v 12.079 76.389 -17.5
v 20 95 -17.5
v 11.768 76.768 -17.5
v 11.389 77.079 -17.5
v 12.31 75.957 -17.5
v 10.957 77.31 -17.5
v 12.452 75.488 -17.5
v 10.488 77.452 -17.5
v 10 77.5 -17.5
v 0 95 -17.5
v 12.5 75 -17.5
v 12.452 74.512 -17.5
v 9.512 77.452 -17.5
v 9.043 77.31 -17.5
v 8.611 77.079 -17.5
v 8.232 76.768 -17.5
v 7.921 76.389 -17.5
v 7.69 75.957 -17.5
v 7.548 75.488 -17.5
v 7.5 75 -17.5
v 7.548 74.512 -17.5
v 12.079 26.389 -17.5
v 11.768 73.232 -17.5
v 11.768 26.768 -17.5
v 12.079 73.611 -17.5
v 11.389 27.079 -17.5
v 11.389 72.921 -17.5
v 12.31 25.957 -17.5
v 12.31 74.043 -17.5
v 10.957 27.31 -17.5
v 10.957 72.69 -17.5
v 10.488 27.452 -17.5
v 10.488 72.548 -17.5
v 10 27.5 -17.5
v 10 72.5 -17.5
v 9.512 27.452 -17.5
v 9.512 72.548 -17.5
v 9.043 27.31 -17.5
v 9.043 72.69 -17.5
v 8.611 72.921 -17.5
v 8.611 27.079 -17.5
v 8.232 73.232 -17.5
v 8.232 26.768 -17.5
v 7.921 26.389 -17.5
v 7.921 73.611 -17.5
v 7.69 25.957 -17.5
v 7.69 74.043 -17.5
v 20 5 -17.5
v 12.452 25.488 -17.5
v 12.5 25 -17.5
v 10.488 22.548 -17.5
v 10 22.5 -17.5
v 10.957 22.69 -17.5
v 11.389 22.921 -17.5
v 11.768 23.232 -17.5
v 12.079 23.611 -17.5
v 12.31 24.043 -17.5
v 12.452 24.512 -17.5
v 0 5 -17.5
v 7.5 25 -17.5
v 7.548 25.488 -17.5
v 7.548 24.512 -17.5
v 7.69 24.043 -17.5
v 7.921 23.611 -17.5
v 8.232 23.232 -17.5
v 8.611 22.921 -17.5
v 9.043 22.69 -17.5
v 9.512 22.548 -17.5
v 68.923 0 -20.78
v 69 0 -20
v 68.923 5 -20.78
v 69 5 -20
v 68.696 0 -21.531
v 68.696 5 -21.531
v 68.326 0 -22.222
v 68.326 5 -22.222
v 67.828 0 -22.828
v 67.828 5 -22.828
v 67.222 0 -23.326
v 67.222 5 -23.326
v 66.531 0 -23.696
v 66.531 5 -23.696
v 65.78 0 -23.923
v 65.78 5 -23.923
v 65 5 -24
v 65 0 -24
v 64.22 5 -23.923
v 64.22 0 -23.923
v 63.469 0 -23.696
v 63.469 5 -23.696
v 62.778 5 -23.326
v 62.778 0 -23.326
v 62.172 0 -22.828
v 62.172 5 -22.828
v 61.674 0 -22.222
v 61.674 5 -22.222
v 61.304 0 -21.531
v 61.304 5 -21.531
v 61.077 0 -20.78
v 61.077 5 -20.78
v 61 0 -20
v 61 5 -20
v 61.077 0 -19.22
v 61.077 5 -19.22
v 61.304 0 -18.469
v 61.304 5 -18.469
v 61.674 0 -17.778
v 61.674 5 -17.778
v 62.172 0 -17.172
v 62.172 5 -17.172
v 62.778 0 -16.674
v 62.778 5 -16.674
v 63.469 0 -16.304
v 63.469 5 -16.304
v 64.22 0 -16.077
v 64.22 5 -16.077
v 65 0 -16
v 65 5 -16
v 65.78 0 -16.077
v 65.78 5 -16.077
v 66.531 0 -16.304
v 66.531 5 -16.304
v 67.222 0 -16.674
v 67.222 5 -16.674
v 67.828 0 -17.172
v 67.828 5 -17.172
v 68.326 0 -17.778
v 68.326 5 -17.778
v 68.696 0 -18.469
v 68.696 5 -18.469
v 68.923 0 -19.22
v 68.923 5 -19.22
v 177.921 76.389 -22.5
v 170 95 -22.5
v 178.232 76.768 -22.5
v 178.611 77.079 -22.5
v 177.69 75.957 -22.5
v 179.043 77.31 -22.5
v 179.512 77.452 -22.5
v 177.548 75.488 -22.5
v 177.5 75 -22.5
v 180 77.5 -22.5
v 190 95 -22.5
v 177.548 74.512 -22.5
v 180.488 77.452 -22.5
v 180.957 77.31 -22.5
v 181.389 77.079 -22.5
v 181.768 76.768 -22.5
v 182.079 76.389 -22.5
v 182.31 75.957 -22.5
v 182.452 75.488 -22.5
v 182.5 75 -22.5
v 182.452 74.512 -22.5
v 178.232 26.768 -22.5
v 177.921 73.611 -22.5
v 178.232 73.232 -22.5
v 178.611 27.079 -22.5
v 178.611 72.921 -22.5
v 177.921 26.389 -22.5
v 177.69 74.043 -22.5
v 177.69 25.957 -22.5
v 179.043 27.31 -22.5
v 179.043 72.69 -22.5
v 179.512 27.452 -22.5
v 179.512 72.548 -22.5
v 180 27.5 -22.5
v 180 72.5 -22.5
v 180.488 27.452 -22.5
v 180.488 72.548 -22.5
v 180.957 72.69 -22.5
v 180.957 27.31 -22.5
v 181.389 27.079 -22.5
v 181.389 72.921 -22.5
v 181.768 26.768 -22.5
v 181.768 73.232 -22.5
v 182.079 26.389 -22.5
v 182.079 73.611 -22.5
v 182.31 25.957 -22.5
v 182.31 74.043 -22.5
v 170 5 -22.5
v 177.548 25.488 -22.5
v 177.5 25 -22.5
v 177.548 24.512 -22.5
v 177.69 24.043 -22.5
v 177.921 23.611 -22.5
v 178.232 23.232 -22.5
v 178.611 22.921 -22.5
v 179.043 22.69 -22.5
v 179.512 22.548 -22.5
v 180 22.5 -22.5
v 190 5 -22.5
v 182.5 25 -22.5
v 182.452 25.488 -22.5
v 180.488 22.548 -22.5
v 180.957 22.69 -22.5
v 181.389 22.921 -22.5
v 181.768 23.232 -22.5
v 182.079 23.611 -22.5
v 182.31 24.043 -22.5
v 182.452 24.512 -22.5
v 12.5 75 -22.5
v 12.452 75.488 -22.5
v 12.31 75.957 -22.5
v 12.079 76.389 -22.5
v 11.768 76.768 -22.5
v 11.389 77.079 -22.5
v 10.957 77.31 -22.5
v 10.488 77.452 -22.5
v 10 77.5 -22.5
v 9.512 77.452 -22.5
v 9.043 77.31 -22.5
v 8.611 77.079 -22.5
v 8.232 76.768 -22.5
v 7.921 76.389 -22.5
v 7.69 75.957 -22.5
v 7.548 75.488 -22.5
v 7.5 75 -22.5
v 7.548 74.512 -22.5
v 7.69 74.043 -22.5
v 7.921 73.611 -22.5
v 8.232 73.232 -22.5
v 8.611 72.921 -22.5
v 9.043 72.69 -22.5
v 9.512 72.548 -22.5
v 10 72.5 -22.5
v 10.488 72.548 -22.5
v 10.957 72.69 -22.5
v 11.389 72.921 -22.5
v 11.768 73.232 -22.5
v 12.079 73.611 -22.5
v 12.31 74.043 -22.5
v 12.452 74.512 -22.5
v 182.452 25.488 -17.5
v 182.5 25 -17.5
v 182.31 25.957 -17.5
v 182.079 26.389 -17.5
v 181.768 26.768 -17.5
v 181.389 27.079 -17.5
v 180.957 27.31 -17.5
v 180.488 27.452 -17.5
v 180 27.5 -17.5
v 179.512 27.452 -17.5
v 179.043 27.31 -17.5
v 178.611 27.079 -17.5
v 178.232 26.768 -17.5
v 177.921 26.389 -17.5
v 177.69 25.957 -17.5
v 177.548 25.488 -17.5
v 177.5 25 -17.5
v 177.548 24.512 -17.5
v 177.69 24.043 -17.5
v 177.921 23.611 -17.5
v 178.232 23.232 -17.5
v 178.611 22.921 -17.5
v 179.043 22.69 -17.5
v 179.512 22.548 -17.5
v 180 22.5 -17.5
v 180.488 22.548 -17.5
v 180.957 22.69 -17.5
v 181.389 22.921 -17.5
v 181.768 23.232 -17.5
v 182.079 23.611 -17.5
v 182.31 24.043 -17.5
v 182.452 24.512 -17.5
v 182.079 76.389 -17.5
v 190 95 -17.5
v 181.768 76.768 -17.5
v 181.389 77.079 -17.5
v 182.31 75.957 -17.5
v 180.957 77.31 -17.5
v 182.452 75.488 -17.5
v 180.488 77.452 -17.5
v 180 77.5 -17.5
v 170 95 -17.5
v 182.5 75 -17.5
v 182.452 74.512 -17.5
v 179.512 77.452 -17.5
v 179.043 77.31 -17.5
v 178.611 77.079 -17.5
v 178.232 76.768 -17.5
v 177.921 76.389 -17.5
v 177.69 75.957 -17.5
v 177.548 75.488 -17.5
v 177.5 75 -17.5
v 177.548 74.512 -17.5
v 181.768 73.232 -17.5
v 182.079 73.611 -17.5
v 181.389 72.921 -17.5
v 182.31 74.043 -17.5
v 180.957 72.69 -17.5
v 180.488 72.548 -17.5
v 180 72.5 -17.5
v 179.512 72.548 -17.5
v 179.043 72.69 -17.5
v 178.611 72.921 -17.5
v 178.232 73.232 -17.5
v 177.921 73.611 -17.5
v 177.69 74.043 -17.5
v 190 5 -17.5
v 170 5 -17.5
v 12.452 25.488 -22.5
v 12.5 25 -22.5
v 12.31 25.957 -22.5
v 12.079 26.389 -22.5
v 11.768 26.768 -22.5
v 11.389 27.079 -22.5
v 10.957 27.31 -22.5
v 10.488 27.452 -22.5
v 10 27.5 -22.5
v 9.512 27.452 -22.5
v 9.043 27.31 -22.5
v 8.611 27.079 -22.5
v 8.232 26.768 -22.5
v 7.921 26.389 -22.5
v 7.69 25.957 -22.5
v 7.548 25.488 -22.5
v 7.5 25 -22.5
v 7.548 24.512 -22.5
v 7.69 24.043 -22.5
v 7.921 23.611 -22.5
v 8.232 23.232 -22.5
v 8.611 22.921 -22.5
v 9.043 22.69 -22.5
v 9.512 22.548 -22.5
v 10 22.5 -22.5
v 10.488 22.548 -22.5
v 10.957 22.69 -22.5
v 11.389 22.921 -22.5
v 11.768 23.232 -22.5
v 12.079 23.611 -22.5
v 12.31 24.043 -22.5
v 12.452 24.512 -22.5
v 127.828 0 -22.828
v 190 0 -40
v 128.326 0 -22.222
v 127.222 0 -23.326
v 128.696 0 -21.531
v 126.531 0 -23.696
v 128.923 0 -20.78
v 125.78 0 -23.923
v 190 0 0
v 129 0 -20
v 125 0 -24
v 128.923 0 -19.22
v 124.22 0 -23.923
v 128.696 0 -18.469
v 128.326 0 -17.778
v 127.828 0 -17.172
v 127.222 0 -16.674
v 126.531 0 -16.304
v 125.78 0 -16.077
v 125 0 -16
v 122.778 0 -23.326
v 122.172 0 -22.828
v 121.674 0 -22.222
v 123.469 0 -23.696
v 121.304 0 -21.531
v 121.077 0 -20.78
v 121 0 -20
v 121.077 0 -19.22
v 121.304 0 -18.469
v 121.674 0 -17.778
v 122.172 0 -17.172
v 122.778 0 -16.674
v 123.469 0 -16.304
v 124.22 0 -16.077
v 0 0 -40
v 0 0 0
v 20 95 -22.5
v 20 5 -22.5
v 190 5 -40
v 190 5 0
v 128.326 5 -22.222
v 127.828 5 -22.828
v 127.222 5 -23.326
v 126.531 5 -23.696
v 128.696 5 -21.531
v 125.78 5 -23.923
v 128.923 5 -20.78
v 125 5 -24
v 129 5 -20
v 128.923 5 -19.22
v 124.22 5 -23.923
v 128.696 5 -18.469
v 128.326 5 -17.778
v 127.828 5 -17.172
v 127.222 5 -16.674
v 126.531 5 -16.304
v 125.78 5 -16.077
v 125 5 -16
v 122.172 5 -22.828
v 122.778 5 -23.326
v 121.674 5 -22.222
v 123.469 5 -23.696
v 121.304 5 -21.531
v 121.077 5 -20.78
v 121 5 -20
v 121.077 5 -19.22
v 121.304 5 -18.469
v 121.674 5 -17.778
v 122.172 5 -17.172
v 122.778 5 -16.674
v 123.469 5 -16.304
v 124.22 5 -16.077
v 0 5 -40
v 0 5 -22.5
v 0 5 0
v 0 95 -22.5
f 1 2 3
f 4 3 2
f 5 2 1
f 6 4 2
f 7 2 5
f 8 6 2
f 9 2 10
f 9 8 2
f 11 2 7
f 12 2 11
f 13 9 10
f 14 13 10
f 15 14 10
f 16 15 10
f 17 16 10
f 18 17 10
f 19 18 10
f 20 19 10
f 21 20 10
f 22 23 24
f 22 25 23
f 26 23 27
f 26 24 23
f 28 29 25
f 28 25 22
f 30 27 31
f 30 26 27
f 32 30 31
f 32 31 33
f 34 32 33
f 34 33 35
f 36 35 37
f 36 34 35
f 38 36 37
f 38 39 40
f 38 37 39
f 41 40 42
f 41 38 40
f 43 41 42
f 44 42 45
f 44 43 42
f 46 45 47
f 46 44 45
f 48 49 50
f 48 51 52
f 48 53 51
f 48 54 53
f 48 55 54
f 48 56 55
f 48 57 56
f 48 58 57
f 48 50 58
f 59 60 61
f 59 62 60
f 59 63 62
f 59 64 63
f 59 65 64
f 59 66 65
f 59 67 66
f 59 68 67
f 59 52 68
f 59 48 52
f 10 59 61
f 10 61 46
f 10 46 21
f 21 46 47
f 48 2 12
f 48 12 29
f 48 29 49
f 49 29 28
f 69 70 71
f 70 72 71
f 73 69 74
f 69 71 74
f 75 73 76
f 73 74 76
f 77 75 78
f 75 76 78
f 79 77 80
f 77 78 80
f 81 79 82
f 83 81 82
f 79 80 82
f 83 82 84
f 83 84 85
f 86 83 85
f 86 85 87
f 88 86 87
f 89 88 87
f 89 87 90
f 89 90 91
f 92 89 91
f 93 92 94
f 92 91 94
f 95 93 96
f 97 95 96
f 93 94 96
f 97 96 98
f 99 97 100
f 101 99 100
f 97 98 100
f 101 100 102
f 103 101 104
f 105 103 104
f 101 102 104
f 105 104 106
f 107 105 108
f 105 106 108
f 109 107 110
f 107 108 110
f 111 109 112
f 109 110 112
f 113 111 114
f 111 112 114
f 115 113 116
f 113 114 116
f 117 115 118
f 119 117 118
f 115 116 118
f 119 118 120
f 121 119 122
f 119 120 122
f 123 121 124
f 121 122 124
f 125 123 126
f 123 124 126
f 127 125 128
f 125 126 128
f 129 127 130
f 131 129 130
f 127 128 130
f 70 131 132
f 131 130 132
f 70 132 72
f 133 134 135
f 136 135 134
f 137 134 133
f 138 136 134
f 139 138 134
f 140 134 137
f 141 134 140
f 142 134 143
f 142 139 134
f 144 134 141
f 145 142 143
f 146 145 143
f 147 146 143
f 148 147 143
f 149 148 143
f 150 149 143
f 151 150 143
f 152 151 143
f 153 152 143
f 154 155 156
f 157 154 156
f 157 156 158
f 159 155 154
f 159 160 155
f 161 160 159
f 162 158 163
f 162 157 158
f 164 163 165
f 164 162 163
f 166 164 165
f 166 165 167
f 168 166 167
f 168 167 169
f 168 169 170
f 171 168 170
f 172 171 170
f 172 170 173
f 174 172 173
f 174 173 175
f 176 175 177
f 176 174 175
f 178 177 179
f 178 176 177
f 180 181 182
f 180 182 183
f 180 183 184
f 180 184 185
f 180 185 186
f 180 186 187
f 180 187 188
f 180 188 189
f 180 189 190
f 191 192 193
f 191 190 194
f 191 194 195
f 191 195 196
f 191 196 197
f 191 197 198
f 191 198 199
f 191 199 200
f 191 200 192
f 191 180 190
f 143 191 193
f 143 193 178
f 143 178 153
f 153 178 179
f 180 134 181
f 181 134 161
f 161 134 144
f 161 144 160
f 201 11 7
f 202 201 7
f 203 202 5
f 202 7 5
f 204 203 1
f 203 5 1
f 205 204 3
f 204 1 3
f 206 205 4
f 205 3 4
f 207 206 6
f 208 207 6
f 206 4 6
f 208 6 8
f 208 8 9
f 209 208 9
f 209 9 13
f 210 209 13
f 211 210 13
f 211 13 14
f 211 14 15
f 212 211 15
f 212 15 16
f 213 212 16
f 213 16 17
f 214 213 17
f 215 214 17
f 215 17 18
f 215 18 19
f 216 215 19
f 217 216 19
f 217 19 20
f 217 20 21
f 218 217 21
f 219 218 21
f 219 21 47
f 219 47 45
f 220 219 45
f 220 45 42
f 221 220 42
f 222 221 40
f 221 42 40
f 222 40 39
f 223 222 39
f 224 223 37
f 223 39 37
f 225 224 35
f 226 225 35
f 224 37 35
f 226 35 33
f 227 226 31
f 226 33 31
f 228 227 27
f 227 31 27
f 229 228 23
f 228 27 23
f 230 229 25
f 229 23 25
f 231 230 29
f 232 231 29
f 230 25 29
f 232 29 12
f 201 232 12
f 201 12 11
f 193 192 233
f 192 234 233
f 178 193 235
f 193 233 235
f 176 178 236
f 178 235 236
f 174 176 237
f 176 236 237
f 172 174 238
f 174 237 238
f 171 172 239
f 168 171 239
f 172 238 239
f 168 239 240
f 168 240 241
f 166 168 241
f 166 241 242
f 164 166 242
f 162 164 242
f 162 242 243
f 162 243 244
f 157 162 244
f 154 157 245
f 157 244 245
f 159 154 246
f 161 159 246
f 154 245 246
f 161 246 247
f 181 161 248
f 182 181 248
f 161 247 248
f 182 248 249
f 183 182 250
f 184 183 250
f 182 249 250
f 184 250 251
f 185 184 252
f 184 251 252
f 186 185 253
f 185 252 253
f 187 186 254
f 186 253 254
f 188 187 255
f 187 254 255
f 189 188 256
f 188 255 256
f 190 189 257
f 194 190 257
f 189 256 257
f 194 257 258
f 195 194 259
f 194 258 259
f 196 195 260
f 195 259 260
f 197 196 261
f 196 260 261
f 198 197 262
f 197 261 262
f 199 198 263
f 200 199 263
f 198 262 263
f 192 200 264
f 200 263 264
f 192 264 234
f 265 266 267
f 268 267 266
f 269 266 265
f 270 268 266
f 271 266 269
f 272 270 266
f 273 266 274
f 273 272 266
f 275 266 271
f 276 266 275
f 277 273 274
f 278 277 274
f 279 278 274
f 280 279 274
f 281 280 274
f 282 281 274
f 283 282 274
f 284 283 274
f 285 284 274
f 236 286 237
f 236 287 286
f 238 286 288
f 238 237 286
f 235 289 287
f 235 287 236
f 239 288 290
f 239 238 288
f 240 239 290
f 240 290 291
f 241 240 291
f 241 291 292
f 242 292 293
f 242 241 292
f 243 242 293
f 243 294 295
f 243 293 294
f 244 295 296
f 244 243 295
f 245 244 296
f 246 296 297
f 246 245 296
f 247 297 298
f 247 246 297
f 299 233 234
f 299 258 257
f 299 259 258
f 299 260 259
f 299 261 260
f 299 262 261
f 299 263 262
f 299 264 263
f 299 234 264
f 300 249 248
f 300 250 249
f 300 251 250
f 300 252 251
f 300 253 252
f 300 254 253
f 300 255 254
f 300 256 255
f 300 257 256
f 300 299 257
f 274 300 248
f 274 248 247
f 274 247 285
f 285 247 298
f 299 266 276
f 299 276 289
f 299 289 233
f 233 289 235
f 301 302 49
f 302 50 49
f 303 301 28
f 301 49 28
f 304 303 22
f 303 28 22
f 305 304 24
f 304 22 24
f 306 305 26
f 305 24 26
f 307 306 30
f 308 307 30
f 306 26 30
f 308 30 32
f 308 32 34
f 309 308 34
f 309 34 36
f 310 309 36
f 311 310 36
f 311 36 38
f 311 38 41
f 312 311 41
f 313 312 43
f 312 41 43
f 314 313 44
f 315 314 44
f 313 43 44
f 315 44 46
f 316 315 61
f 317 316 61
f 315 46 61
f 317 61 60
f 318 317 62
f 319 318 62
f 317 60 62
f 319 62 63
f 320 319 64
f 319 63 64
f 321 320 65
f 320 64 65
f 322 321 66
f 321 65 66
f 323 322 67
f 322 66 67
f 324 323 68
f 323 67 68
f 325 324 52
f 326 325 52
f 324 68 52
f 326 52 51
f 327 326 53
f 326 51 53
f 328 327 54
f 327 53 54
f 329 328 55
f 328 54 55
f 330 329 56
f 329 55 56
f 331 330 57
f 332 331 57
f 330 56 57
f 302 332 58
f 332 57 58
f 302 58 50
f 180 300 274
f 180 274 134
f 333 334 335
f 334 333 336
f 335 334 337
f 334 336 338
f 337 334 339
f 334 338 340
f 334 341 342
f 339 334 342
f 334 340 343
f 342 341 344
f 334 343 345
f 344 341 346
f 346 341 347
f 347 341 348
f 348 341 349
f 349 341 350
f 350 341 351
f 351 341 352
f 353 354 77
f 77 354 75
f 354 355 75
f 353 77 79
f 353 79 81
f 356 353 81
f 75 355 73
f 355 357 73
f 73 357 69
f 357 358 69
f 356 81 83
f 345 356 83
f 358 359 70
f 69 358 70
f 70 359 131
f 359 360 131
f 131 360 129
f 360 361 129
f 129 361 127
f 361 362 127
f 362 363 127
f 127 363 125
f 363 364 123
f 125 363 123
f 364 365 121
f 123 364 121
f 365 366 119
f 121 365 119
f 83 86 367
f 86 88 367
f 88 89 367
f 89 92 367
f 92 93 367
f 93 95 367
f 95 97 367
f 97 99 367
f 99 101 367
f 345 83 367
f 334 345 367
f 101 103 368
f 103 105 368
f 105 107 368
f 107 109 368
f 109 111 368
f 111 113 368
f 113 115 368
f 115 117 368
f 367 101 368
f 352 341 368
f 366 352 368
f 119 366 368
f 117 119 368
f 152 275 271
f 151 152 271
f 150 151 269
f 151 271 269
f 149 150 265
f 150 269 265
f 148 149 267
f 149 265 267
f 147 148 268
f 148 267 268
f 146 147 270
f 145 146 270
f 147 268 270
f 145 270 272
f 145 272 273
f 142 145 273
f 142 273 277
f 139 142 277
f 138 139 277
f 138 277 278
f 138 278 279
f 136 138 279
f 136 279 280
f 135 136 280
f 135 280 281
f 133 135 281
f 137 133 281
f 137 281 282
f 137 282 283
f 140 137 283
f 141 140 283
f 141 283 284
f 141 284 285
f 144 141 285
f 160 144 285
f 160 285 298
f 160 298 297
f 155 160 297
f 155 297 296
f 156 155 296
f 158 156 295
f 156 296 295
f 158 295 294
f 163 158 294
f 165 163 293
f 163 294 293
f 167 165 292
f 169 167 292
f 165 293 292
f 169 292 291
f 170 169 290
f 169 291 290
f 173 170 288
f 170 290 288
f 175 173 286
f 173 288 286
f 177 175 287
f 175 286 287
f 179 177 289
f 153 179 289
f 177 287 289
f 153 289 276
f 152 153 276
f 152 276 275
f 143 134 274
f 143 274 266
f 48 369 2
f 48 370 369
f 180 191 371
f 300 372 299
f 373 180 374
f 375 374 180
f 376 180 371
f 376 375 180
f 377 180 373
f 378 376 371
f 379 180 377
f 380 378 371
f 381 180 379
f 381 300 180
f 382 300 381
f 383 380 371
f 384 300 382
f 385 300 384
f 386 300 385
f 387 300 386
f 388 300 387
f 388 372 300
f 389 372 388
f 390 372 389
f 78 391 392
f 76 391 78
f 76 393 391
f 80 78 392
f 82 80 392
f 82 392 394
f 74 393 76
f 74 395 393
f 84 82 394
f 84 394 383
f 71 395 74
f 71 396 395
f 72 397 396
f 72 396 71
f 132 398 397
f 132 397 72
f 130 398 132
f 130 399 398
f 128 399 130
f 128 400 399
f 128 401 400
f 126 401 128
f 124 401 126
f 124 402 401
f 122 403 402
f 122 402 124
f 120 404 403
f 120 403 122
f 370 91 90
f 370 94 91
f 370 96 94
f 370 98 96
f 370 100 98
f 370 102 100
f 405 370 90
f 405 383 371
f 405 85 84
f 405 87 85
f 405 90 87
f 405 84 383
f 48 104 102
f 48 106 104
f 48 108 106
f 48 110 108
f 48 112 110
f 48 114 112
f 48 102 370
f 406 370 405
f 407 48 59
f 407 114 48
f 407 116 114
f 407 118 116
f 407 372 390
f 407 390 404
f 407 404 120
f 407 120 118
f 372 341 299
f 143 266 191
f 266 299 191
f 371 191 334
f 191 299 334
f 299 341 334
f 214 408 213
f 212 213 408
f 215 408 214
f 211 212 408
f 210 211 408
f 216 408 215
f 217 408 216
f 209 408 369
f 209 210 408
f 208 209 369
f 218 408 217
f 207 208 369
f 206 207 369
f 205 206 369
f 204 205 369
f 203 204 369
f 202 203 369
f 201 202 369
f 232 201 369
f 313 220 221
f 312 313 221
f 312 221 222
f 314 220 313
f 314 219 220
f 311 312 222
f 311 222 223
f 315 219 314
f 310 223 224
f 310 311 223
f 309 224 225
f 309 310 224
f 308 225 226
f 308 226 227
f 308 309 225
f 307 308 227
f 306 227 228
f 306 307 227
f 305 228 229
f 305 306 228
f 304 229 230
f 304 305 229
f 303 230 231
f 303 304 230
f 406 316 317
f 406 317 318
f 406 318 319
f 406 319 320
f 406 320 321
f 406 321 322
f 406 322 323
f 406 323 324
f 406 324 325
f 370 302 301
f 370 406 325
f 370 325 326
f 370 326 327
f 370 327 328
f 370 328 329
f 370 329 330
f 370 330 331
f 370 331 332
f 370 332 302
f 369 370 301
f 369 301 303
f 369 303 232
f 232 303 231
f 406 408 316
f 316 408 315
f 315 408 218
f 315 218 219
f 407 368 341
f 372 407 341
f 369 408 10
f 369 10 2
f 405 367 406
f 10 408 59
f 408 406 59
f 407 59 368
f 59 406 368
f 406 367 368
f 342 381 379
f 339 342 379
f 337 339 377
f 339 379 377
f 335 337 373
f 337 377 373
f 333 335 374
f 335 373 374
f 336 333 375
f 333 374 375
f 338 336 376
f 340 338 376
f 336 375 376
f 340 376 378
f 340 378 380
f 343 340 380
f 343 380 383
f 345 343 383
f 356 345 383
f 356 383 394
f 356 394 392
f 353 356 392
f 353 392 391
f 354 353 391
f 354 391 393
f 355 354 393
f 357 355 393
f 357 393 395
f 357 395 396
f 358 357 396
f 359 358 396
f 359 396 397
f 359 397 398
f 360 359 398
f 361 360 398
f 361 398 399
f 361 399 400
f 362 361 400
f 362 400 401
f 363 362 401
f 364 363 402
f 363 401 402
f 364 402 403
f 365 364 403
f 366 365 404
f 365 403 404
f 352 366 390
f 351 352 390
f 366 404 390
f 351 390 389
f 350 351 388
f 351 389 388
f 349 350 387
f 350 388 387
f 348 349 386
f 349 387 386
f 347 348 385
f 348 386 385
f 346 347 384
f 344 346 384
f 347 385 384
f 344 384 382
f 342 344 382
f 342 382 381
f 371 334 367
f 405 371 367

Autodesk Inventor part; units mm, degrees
ref_plane "YZ Plane" through (0, 0, 0) normal (1, 0, 0) x (0, 1, 0)
ref_plane "XZ Plane" through (0, 0, 0) normal (0, 1, 0) x (-1, 0, 0)
ref_plane "XY Plane" through (0, 0, 0) normal (0, 0, 1) x (1, 0, 0)
sketch "Sketch1" plane through (0, 0, 0) normal (0, 1, 0) x (-1, 0, 0)
  line L0 (0, 0) -> (-190, 0)
  line L1 (-190, 0) -> (-190, -40)
  line L2 (-190, -40) -> (0, -40)
  line L3 (0, -40) -> (0, 0)
  dimension "d0" = 190
  dimension "d1" = 40
extrude "Extrusion1" add sketch "Sketch1" along normal blind 5
sketch "Sketch2" plane through (0, 5, 0) normal (0, 1, 0) x (1, 0, 0)
  line L0 (20, 17.5) -> (0, 17.5)
  line L1 (0, 17.5) -> (0, 22.5)
  line L2 (0, 22.5) -> (20, 22.5)
  line L3 (20, 22.5) -> (20, 17.5)
  line L4 (170, 22.5) -> (190, 22.5)
  line L5 (190, 22.5) -> (190, 17.5)
  line L6 (190, 17.5) -> (170, 17.5)
  line L7 (170, 17.5) -> (170, 22.5)
  line L8 (0, 40) -> (0, 0) projected
  line L9 (190, 0) -> (190, 40) projected
  point P0 (0, 20)
  point P1 (0, 20)
  point P2 (190, 20)
  point P3 (190, 20)
  point P4 (0, 20)
  point P5 (190, 20)
  dimension "d4" = 20
  dimension "d5" = 5
  dimension "d6" = 20
  dimension "d7" = 5
extrude "Extrusion2" add sketch "Sketch2" along normal blind 90
sketch "Sketch3" plane through (0, 5, 0) normal (0, 1, 0) x (1, 0, 0)
  circle A0 centre (65, 20) radius 4
  circle A1 centre (125, 20) radius 4
  line L0 (0, 22.5) -> (0, 17.5) projected
  line L1 (65, 20) -> (125, 20) construction
  line L2 (0, 0) -> (190, 0) projected
  point P0 (0, 20)
  point P1 (95, 20)
  point P2 (95, 0)
  dimension "d10" = 8
  dimension "d11" = 8
  dimension "d12" = 60
extrude "Extrusion3" cut sketch "Sketch3" against normal blind 90
sketch "Sketch4" plane through (170, 5, -17.5) normal (0, 0, 1) x (1, 0, 0)
  circle A0 centre (10, 20) radius 2.5
  circle A1 centre (10, 70) radius 2.5
  circle A2 centre (-160, 70) radius 2.5
  circle A3 centre (-160, 20) radius 2.5
  line L0 (0, 90) -> (20, 90) projected
  line L1 (-170, 90) -> (-150, 90) projected
  point P0 (-170, -5)
  point P1 (10, 90)
  point P2 (-160, 90)
  dimension "d17" = 5
  dimension "d18" = 5
  dimension "d19" = 5
  dimension "d20" = 5
  dimension "d21" = 50
  dimension "d22" = 50
  dimension "d23" = 20
  dimension "d24" = 20
extrude "Extrusion4" cut sketch "Sketch4" against normal blind 90
equation "\"d22\" = d21"
equation "\"d24\" = d23"
properties part number "X-Axis Panel Mount" material "Steel"
